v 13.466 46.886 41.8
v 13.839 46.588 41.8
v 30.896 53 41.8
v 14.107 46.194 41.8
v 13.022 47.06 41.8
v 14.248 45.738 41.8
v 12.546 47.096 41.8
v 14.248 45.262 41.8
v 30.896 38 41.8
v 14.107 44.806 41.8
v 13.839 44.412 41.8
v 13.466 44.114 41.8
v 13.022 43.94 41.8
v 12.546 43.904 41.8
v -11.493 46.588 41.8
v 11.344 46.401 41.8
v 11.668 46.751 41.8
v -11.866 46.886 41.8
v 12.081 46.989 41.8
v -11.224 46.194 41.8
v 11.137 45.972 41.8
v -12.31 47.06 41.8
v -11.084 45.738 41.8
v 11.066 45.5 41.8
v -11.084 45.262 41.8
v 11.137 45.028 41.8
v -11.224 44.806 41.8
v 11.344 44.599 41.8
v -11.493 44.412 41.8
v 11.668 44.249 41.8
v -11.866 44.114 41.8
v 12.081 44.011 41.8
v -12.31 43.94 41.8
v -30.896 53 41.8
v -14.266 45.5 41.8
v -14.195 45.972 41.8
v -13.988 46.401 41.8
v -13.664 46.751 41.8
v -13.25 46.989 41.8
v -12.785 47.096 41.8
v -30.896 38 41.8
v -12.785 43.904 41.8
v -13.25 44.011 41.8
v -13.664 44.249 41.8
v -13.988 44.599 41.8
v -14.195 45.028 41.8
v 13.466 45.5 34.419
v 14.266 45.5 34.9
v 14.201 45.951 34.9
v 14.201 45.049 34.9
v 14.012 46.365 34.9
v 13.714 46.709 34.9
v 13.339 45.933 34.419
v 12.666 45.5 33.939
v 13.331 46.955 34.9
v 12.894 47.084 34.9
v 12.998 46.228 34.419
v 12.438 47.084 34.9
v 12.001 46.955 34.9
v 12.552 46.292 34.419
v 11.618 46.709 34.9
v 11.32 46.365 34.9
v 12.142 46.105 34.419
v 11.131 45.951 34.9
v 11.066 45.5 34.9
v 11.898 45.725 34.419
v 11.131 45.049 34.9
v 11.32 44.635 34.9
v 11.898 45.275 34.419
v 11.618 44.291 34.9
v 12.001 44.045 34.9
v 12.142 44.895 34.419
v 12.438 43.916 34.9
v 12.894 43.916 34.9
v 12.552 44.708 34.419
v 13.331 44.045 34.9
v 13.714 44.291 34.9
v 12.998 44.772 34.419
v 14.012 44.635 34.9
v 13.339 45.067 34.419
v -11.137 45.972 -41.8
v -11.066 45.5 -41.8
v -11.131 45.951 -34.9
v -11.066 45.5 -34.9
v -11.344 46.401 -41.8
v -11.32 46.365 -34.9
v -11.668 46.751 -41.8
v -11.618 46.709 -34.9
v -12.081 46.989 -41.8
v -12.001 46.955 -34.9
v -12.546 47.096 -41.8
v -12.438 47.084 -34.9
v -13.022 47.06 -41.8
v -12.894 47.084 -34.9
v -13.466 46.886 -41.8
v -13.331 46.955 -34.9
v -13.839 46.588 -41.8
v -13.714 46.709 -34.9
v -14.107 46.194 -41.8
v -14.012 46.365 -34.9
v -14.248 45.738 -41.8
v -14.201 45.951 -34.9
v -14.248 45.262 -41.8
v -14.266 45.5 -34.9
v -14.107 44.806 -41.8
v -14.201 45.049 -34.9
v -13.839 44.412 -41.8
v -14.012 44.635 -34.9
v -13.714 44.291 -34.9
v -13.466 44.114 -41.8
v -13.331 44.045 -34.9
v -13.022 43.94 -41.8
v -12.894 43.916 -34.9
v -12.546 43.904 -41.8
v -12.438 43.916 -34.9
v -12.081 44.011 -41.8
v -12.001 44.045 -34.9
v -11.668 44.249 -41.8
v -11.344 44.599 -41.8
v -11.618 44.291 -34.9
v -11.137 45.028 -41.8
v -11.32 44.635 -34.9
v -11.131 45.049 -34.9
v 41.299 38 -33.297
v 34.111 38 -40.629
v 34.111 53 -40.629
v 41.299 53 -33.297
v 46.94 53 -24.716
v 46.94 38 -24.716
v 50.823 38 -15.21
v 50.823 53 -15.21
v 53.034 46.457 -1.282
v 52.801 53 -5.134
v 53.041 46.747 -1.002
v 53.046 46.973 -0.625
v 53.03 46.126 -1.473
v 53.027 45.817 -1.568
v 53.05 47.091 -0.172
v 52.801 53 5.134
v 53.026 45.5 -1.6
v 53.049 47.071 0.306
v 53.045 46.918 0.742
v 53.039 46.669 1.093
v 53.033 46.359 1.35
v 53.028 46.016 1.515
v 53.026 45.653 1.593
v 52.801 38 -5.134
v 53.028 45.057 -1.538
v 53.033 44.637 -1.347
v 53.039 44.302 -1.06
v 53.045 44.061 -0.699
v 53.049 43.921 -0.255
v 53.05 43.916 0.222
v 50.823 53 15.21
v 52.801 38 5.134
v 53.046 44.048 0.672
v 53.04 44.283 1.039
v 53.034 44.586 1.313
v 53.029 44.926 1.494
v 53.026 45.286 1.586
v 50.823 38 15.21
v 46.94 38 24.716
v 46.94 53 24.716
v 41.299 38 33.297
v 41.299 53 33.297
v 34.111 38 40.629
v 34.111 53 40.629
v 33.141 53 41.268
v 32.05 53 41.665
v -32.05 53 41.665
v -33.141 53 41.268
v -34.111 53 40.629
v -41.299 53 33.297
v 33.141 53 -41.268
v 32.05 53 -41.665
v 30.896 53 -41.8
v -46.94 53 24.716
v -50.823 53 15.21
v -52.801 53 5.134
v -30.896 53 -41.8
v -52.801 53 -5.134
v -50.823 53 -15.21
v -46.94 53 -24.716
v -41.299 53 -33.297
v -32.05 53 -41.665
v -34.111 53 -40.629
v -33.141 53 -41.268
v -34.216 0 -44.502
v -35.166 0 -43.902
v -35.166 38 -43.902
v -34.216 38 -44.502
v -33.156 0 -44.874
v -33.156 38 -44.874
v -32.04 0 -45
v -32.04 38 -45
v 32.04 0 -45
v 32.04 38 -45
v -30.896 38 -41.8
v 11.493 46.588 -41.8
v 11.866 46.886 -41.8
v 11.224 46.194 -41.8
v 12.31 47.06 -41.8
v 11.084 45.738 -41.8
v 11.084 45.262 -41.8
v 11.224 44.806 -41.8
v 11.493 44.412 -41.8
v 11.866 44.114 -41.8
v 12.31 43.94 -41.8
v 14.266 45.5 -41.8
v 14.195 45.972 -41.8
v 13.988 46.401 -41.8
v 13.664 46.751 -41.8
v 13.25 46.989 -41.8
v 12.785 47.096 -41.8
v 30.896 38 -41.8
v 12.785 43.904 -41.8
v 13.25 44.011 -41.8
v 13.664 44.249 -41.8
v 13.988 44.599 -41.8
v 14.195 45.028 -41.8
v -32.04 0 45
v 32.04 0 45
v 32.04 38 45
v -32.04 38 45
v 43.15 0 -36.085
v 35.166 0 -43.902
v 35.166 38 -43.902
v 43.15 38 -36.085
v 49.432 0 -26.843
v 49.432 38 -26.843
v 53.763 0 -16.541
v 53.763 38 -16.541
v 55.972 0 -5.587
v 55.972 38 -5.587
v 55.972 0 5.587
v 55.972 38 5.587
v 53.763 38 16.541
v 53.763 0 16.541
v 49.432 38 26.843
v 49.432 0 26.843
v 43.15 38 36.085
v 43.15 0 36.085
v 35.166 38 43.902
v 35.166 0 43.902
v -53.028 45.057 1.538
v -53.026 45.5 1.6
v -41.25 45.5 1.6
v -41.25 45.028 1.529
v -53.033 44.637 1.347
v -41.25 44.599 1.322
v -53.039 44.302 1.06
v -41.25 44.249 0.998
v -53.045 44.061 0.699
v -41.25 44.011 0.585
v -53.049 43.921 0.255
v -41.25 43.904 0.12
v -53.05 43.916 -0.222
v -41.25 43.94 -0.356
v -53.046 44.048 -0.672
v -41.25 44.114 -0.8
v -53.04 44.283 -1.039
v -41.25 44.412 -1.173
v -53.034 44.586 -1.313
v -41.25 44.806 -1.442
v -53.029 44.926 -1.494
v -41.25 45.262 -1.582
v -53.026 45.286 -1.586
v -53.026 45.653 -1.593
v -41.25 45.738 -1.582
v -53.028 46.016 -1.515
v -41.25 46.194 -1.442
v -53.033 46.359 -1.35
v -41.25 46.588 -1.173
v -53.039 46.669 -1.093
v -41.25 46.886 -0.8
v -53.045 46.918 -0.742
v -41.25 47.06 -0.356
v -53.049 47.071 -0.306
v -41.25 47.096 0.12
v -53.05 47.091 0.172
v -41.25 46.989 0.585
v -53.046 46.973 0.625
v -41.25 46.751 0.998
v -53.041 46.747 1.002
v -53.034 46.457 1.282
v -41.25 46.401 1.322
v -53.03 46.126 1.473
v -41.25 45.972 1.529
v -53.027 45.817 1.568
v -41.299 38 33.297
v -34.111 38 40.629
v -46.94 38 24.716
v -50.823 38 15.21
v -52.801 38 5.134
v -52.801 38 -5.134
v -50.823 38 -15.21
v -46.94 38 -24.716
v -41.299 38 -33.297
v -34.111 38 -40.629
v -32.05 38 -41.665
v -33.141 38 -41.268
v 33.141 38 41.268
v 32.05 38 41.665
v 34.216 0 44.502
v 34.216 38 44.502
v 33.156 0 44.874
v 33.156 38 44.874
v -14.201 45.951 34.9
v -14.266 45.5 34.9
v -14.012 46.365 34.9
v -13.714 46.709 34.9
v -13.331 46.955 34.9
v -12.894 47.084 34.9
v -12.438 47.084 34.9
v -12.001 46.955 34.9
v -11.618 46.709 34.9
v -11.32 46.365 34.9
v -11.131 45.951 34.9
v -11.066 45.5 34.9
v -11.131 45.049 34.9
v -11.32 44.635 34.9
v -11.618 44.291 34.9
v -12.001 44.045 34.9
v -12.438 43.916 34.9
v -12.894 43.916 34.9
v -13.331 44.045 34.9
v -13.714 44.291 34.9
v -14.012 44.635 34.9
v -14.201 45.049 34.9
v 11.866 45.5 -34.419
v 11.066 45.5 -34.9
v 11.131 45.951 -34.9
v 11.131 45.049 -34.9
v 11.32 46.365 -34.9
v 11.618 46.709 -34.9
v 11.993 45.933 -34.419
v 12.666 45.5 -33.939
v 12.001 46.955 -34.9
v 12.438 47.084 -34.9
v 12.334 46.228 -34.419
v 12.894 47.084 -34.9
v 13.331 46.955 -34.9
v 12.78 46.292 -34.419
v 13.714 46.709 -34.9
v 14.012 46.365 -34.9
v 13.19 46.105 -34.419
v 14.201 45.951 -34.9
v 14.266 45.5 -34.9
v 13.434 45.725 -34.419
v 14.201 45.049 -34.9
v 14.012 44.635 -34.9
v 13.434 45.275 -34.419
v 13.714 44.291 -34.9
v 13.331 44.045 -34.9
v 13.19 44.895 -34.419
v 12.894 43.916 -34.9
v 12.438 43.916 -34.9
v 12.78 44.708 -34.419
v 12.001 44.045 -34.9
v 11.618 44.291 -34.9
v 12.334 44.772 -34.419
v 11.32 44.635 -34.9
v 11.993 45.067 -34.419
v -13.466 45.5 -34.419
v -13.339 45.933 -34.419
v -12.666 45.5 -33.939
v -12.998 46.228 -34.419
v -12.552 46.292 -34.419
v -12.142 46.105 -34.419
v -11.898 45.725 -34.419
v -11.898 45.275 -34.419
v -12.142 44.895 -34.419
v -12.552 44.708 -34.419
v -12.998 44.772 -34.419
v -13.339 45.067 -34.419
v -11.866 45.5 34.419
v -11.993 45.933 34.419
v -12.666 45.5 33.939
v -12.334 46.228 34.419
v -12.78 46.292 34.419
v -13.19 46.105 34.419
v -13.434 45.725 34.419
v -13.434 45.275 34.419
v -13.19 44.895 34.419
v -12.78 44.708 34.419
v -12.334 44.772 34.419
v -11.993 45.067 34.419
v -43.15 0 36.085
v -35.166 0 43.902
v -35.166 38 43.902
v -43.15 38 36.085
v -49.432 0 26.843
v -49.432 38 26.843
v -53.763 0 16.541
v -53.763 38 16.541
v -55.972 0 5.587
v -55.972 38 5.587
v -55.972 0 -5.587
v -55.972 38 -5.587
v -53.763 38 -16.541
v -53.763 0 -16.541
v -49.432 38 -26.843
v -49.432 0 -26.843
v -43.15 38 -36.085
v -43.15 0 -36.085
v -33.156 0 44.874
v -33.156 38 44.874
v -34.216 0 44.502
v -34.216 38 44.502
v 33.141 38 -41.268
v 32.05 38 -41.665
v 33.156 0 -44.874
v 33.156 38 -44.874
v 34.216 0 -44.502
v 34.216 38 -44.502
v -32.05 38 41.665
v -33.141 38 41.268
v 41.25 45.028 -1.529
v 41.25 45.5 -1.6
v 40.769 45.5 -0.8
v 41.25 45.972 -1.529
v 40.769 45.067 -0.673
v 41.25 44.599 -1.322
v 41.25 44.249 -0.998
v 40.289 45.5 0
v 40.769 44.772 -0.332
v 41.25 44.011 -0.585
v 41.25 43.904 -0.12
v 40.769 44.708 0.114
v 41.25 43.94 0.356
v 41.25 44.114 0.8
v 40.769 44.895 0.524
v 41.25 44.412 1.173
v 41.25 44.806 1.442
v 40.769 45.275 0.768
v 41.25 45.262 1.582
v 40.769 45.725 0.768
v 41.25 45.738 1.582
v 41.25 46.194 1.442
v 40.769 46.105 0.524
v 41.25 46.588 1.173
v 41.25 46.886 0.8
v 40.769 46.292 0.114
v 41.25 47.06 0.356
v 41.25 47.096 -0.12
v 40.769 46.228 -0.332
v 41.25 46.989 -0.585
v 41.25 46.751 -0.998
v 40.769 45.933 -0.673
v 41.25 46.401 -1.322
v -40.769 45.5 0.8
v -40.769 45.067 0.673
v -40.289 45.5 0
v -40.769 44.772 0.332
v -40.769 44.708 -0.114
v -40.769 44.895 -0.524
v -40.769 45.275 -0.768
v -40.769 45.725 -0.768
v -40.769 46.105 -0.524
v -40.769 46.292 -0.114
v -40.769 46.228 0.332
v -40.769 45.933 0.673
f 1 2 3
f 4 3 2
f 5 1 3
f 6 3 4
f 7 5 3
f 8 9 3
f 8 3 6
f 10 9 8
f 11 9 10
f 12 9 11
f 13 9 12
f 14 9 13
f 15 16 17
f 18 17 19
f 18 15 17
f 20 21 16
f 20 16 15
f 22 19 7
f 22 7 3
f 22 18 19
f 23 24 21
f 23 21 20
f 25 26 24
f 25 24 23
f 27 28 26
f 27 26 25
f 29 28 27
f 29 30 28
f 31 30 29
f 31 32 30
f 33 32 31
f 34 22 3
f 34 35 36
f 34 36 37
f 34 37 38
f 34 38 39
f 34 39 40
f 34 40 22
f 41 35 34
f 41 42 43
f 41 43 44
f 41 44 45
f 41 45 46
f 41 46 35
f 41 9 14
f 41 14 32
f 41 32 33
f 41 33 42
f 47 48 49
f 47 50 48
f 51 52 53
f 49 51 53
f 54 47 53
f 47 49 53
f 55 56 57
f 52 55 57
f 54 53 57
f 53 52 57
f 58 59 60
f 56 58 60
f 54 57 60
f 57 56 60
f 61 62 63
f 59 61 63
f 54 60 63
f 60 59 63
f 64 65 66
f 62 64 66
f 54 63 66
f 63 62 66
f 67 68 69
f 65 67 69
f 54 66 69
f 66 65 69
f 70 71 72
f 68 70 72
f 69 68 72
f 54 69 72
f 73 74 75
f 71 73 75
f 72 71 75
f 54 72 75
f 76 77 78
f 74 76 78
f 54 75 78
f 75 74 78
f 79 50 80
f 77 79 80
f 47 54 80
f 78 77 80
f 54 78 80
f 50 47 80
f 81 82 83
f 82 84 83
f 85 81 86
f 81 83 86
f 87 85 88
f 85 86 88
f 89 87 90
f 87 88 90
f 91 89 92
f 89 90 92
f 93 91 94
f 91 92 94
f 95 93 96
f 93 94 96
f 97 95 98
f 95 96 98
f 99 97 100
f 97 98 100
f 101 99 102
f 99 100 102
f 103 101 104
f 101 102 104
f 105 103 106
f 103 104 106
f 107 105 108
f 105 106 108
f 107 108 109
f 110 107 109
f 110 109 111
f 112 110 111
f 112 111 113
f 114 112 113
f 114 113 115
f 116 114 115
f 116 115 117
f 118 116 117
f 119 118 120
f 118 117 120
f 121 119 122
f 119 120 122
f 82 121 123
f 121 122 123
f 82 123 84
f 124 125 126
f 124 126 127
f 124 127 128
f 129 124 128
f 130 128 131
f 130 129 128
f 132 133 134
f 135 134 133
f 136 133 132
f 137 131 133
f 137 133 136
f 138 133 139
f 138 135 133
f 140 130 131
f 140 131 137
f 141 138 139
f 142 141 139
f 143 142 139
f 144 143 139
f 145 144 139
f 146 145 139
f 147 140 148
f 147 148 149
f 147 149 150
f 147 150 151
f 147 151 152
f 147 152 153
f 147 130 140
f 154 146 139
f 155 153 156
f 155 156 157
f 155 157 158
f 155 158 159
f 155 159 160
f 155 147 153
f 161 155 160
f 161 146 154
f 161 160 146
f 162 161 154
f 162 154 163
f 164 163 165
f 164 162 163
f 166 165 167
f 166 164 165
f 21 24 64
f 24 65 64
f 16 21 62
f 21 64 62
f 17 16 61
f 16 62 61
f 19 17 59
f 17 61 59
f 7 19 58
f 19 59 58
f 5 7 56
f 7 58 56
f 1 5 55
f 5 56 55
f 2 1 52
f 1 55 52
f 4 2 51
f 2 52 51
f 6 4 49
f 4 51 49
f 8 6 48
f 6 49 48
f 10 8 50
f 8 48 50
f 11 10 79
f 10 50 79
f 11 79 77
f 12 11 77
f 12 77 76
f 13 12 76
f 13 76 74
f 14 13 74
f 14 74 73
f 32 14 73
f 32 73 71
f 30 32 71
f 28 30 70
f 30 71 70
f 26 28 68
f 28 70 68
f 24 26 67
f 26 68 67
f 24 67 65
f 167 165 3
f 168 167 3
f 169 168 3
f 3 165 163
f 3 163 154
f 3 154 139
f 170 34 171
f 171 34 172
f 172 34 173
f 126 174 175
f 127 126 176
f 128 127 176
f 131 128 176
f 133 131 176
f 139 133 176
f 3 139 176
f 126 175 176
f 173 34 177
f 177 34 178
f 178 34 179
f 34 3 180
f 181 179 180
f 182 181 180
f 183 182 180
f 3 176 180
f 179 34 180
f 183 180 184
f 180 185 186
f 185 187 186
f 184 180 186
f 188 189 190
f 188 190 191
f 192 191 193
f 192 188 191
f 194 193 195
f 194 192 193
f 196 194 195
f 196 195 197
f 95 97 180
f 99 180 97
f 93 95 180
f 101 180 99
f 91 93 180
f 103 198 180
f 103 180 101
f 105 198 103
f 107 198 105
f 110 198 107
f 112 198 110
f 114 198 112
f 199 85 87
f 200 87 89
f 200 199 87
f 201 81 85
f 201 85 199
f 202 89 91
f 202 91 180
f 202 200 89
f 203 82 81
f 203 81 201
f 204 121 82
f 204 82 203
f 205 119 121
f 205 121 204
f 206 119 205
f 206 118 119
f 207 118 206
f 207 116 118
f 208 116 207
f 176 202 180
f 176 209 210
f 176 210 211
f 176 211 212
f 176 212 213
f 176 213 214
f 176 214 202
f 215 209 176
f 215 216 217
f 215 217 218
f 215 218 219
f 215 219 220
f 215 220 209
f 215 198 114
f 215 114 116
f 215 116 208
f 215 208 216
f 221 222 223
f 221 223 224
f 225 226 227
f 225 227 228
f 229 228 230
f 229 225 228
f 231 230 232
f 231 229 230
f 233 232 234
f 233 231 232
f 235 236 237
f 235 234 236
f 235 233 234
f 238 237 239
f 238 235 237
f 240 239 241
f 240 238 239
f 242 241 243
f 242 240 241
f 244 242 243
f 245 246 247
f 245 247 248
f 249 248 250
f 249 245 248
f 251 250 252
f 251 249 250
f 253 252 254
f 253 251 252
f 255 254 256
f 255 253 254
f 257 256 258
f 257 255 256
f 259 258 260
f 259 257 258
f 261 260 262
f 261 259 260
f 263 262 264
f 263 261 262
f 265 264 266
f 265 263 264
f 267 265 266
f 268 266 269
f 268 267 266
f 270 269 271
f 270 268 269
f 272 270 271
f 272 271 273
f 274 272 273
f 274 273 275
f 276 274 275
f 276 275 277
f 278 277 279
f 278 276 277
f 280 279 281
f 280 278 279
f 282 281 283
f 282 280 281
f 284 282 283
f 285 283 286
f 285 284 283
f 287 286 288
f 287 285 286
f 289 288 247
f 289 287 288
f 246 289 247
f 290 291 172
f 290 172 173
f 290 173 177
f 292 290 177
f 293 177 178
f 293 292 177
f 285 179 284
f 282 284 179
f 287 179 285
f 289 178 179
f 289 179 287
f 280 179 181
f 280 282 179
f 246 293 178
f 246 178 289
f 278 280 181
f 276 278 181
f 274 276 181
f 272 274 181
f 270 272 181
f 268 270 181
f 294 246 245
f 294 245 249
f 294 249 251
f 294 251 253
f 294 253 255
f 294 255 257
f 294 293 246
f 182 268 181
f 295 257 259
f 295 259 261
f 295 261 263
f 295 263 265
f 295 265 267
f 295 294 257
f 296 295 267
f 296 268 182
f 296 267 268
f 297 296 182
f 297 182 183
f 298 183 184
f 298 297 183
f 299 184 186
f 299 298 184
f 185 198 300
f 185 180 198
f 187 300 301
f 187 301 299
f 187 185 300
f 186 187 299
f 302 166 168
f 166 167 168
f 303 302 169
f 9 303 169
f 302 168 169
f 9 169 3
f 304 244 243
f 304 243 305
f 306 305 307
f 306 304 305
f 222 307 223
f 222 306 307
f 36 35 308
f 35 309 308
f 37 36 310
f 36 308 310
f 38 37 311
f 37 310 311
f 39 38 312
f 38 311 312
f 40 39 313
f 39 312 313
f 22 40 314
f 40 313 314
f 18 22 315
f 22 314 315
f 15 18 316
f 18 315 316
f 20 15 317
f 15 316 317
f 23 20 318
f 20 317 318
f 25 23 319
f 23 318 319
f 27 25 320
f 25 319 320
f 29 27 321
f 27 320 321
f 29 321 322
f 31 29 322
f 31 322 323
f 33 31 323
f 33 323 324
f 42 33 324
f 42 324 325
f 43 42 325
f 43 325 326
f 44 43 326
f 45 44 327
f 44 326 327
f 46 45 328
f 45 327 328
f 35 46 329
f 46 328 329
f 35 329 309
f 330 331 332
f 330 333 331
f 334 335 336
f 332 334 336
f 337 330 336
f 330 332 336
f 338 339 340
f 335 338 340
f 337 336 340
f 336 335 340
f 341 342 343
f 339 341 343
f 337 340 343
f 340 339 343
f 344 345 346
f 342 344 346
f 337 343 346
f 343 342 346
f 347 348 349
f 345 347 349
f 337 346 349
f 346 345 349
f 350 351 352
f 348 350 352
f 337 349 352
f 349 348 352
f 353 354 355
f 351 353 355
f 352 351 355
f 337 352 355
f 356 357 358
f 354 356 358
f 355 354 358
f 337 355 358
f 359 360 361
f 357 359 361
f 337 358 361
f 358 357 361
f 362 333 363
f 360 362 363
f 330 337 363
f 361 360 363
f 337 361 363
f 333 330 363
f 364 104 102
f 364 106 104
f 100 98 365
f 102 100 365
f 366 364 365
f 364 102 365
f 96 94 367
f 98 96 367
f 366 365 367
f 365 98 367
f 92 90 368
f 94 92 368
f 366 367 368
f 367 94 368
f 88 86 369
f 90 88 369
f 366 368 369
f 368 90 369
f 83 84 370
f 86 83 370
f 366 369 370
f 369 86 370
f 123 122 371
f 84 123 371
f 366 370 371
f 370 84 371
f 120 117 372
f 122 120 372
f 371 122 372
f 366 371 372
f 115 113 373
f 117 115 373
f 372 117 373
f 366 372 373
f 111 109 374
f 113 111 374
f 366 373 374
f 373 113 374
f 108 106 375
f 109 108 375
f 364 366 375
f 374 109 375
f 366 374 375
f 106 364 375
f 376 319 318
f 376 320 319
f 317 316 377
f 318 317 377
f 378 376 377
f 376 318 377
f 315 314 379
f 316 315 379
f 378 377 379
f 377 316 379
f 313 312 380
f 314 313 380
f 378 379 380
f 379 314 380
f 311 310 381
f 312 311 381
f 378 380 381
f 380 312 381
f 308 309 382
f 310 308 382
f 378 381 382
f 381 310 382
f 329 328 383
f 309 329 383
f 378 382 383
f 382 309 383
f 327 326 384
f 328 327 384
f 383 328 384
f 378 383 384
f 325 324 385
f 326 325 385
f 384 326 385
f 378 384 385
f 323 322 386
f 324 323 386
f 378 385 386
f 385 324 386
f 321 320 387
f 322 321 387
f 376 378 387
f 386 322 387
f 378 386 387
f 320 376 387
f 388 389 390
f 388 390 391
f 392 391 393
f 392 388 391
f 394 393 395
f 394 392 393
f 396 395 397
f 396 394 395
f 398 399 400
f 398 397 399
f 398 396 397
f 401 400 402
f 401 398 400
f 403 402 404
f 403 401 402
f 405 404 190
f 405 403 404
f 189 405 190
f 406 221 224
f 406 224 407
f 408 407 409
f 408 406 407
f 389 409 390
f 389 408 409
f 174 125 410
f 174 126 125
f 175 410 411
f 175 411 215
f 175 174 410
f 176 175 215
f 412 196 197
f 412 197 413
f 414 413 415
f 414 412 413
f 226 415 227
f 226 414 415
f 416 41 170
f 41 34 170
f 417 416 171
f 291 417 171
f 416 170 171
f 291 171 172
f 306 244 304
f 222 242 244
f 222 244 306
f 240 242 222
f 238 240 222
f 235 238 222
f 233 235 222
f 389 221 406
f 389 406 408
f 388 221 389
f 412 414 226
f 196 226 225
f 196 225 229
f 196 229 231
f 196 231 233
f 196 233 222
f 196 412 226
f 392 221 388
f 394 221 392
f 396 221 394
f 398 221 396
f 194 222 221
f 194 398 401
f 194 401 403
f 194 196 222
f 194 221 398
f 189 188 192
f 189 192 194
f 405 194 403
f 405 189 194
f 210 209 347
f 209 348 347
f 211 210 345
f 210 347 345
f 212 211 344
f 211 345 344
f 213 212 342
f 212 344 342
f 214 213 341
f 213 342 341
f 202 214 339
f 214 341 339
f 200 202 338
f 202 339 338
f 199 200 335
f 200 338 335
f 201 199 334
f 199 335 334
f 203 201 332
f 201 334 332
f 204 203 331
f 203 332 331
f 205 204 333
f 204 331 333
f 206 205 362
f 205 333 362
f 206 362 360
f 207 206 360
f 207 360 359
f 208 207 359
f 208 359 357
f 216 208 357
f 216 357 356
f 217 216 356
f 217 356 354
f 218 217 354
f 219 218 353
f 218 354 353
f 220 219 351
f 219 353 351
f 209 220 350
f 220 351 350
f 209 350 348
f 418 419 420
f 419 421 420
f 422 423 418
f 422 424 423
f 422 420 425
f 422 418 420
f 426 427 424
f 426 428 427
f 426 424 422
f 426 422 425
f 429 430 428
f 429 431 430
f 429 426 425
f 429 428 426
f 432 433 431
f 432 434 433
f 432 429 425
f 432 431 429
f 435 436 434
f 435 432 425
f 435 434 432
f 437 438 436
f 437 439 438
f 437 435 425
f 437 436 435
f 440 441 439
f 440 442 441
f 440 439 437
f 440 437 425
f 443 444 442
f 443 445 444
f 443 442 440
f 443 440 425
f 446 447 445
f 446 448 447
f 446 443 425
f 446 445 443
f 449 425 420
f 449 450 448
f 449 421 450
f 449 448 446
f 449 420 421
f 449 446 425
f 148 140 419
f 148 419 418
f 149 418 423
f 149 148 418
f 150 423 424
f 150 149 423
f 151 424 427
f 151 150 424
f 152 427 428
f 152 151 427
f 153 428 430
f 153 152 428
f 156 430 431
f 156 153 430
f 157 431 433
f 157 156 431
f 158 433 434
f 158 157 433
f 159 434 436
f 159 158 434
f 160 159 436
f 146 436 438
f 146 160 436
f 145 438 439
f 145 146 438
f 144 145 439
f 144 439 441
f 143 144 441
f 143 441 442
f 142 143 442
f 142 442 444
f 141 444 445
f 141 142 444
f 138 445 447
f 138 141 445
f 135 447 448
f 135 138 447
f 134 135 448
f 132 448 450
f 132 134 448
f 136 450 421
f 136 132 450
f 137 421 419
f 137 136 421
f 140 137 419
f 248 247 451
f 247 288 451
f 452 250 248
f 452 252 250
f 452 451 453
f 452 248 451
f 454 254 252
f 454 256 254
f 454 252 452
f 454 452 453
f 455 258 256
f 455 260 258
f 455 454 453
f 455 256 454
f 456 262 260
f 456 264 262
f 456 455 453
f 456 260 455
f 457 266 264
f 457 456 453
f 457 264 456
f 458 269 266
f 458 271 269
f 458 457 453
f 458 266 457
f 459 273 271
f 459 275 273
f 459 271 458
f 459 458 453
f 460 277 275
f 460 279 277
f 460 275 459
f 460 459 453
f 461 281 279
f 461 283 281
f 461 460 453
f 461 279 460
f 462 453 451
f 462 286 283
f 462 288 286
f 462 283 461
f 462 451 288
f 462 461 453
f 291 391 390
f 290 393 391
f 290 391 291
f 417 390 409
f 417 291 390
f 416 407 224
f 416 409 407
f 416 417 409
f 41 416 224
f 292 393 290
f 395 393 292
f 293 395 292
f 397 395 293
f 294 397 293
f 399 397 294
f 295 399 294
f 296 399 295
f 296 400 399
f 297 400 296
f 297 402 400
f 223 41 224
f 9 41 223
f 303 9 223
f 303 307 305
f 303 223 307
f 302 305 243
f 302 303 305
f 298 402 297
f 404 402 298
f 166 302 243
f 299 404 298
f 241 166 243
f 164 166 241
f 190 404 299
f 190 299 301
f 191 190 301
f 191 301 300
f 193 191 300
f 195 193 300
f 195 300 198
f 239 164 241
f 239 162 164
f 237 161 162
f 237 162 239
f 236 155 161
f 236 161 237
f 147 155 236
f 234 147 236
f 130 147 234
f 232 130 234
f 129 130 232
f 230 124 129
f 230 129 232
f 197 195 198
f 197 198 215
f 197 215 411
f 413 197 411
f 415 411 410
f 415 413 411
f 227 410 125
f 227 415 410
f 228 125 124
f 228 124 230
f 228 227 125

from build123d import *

# Parameters (mm, degrees)
Y_KSEKLIK_EKSTR_ZYON1_DEPTH = 53
KES_EKSTR_ZYON1_START       = -15
KES_EKSTR_ZYON1_DEPTH       = 15
M3_BO_LUKLU_DELIK2_D        = 3.2
M3_BO_LUKLU_DELIK2_DEPTH    = 6.9
M3_BO_LUKLU_DELIK2_TIP      = 0.96137699
M3_BO_LUKLU_DELIK1_D        = 3.2
M3_BO_LUKLU_DELIK1_DEPTH    = 6.9
M3_BO_LUKLU_DELIK1_TIP      = 0.96137699
RADYUS1_R                   = 5
DAIRESEL_KAPLAMA1_COUNT     = 2
DAIRESEL_KAPLAMA1_ANGLE     = 180


with BuildPart() as part:
    # Çizim1 → Yükseklik-Ekstrüzyon1 (new body)
    with BuildSketch(Plane(origin=(0, 0, 0), x_dir=(1, 0, 0), z_dir=(0, 1, 0))):
        with BuildLine():
            Line((-32.040014045, 45), (32.040014045, 45))
            ThreePointArc((32.040014045, 45), (33.696486936, 44.717636862), (35.165869074, 43.902439024))
            ThreePointArc((35.165869074, 43.902439024), (56.25, 0), (35.165869074, -43.902439024))
            ThreePointArc((35.165869074, -43.902439024), (33.696486936, -44.717636862), (32.040014045, -45))
            Line((32.040014045, -45), (-32.040014045, -45))
            ThreePointArc((-32.040014045, -45), (-33.696486936, -44.717636862), (-35.165869074, -43.902439024))
            ThreePointArc((-35.165869074, -43.902439024), (-56.25, 0), (-35.165869074, 43.902439024))
            ThreePointArc((-35.165869074, 43.902439024), (-33.696486936, 44.717636862), (-32.040014045, 45))
        make_face()
    extrude(amount=Y_KSEKLIK_EKSTR_ZYON1_DEPTH)

    # Çizim2 → Kes-Ekstrüzyon1 (cut)
    with BuildSketch(Plane(origin=(0, 53, 0), x_dir=(1, 0, 0), z_dir=(0, 1, 0)).offset(KES_EKSTR_ZYON1_START)):
        with BuildLine():
            Line((33.75, 45), (-33.75, 45))
            ThreePointArc((-33.75, 45), (-56.25, 0), (-33.75, -45))
            Line((-33.75, -45), (33.75, -45))
            ThreePointArc((33.75, -45), (56.25, 0), (33.75, 45))
        make_face()
        with BuildLine():
            Line((32.665922611, -41.8), (-32.665922611, -41.8))
            ThreePointArc((-32.665922611, -41.8), (-53.05, 0), (-32.665922611, 41.8))
            Line((-32.665922611, 41.8), (32.665922611, 41.8))
            ThreePointArc((32.665922611, 41.8), (53.05, 0), (32.665922611, -41.8))
        make_face(mode=Mode.SUBTRACT)
    extrude(amount=KES_EKSTR_ZYON1_DEPTH, mode=Mode.SUBTRACT)

    # M3 Boşluklu Delik2
    with Locations(Plane(origin=(0, 0, -41.8), x_dir=(-1, 0, 0), z_dir=(0, 0, -1))):
        with Locations((12.665922611, 45.5), (-12.665922611, 45.5)):
            Hole(M3_BO_LUKLU_DELIK2_D / 2, depth=M3_BO_LUKLU_DELIK2_DEPTH)
            with Locations((0, 0, -(M3_BO_LUKLU_DELIK2_DEPTH + M3_BO_LUKLU_DELIK2_TIP / 2))):  # 118° drill point
                Cone(0, M3_BO_LUKLU_DELIK2_D / 2, M3_BO_LUKLU_DELIK2_TIP, mode=Mode.SUBTRACT)

    # M3 Boşluklu Delik1
    with Locations(Plane.XY.offset(41.8)):
        with Locations((12.665922611, 45.5), (-12.665922611, 45.5)):
            Hole(M3_BO_LUKLU_DELIK1_D / 2, depth=M3_BO_LUKLU_DELIK1_DEPTH)
            with Locations((0, 0, -(M3_BO_LUKLU_DELIK1_DEPTH + M3_BO_LUKLU_DELIK1_TIP / 2))):  # 118° drill point
                Cone(0, M3_BO_LUKLU_DELIK1_D / 2, M3_BO_LUKLU_DELIK1_TIP, mode=Mode.SUBTRACT)

    # Radyus1
    radyus1_edges = [part.edges().sort_by_distance(p)[0] for p in [
        (-32.665922611, 45.5, -41.8),
        (32.665922611, 45.5, -41.8),
        (32.665922611, 45.5, 41.8),
        (-32.665922611, 45.5, 41.8),
    ]]
    fillet(radyus1_edges, radius=RADYUS1_R)

    # Çizim19 → M3 Boşluklu Delik3 (revolve, cut)
    with BuildSketch(Plane(origin=(53.05, 45.5, 0), x_dir=(0, 0, -1), z_dir=(0, 1, 0))):
        Polygon((0, 0), (0, 12.76137699), (1.6, 11.8), (1.6, 0), align=None)
    m3_bo_luklu_delik3 = revolve(axis=Axis((59.4, 45.5, 0), (-1, 0, 0)), mode=Mode.SUBTRACT)

    # Dairesel Kaplama1: M3 Boşluklu Delik3 ×2 about axis
    dairesel_kaplama1_axis = Axis((0, 53, 0), (0, 1, 0))
    for i in range(1, DAIRESEL_KAPLAMA1_COUNT):
        add(m3_bo_luklu_delik3.rotate(dairesel_kaplama1_axis, i * DAIRESEL_KAPLAMA1_ANGLE / (DAIRESEL_KAPLAMA1_COUNT - 1)), mode=Mode.SUBTRACT)


solid = part.part
